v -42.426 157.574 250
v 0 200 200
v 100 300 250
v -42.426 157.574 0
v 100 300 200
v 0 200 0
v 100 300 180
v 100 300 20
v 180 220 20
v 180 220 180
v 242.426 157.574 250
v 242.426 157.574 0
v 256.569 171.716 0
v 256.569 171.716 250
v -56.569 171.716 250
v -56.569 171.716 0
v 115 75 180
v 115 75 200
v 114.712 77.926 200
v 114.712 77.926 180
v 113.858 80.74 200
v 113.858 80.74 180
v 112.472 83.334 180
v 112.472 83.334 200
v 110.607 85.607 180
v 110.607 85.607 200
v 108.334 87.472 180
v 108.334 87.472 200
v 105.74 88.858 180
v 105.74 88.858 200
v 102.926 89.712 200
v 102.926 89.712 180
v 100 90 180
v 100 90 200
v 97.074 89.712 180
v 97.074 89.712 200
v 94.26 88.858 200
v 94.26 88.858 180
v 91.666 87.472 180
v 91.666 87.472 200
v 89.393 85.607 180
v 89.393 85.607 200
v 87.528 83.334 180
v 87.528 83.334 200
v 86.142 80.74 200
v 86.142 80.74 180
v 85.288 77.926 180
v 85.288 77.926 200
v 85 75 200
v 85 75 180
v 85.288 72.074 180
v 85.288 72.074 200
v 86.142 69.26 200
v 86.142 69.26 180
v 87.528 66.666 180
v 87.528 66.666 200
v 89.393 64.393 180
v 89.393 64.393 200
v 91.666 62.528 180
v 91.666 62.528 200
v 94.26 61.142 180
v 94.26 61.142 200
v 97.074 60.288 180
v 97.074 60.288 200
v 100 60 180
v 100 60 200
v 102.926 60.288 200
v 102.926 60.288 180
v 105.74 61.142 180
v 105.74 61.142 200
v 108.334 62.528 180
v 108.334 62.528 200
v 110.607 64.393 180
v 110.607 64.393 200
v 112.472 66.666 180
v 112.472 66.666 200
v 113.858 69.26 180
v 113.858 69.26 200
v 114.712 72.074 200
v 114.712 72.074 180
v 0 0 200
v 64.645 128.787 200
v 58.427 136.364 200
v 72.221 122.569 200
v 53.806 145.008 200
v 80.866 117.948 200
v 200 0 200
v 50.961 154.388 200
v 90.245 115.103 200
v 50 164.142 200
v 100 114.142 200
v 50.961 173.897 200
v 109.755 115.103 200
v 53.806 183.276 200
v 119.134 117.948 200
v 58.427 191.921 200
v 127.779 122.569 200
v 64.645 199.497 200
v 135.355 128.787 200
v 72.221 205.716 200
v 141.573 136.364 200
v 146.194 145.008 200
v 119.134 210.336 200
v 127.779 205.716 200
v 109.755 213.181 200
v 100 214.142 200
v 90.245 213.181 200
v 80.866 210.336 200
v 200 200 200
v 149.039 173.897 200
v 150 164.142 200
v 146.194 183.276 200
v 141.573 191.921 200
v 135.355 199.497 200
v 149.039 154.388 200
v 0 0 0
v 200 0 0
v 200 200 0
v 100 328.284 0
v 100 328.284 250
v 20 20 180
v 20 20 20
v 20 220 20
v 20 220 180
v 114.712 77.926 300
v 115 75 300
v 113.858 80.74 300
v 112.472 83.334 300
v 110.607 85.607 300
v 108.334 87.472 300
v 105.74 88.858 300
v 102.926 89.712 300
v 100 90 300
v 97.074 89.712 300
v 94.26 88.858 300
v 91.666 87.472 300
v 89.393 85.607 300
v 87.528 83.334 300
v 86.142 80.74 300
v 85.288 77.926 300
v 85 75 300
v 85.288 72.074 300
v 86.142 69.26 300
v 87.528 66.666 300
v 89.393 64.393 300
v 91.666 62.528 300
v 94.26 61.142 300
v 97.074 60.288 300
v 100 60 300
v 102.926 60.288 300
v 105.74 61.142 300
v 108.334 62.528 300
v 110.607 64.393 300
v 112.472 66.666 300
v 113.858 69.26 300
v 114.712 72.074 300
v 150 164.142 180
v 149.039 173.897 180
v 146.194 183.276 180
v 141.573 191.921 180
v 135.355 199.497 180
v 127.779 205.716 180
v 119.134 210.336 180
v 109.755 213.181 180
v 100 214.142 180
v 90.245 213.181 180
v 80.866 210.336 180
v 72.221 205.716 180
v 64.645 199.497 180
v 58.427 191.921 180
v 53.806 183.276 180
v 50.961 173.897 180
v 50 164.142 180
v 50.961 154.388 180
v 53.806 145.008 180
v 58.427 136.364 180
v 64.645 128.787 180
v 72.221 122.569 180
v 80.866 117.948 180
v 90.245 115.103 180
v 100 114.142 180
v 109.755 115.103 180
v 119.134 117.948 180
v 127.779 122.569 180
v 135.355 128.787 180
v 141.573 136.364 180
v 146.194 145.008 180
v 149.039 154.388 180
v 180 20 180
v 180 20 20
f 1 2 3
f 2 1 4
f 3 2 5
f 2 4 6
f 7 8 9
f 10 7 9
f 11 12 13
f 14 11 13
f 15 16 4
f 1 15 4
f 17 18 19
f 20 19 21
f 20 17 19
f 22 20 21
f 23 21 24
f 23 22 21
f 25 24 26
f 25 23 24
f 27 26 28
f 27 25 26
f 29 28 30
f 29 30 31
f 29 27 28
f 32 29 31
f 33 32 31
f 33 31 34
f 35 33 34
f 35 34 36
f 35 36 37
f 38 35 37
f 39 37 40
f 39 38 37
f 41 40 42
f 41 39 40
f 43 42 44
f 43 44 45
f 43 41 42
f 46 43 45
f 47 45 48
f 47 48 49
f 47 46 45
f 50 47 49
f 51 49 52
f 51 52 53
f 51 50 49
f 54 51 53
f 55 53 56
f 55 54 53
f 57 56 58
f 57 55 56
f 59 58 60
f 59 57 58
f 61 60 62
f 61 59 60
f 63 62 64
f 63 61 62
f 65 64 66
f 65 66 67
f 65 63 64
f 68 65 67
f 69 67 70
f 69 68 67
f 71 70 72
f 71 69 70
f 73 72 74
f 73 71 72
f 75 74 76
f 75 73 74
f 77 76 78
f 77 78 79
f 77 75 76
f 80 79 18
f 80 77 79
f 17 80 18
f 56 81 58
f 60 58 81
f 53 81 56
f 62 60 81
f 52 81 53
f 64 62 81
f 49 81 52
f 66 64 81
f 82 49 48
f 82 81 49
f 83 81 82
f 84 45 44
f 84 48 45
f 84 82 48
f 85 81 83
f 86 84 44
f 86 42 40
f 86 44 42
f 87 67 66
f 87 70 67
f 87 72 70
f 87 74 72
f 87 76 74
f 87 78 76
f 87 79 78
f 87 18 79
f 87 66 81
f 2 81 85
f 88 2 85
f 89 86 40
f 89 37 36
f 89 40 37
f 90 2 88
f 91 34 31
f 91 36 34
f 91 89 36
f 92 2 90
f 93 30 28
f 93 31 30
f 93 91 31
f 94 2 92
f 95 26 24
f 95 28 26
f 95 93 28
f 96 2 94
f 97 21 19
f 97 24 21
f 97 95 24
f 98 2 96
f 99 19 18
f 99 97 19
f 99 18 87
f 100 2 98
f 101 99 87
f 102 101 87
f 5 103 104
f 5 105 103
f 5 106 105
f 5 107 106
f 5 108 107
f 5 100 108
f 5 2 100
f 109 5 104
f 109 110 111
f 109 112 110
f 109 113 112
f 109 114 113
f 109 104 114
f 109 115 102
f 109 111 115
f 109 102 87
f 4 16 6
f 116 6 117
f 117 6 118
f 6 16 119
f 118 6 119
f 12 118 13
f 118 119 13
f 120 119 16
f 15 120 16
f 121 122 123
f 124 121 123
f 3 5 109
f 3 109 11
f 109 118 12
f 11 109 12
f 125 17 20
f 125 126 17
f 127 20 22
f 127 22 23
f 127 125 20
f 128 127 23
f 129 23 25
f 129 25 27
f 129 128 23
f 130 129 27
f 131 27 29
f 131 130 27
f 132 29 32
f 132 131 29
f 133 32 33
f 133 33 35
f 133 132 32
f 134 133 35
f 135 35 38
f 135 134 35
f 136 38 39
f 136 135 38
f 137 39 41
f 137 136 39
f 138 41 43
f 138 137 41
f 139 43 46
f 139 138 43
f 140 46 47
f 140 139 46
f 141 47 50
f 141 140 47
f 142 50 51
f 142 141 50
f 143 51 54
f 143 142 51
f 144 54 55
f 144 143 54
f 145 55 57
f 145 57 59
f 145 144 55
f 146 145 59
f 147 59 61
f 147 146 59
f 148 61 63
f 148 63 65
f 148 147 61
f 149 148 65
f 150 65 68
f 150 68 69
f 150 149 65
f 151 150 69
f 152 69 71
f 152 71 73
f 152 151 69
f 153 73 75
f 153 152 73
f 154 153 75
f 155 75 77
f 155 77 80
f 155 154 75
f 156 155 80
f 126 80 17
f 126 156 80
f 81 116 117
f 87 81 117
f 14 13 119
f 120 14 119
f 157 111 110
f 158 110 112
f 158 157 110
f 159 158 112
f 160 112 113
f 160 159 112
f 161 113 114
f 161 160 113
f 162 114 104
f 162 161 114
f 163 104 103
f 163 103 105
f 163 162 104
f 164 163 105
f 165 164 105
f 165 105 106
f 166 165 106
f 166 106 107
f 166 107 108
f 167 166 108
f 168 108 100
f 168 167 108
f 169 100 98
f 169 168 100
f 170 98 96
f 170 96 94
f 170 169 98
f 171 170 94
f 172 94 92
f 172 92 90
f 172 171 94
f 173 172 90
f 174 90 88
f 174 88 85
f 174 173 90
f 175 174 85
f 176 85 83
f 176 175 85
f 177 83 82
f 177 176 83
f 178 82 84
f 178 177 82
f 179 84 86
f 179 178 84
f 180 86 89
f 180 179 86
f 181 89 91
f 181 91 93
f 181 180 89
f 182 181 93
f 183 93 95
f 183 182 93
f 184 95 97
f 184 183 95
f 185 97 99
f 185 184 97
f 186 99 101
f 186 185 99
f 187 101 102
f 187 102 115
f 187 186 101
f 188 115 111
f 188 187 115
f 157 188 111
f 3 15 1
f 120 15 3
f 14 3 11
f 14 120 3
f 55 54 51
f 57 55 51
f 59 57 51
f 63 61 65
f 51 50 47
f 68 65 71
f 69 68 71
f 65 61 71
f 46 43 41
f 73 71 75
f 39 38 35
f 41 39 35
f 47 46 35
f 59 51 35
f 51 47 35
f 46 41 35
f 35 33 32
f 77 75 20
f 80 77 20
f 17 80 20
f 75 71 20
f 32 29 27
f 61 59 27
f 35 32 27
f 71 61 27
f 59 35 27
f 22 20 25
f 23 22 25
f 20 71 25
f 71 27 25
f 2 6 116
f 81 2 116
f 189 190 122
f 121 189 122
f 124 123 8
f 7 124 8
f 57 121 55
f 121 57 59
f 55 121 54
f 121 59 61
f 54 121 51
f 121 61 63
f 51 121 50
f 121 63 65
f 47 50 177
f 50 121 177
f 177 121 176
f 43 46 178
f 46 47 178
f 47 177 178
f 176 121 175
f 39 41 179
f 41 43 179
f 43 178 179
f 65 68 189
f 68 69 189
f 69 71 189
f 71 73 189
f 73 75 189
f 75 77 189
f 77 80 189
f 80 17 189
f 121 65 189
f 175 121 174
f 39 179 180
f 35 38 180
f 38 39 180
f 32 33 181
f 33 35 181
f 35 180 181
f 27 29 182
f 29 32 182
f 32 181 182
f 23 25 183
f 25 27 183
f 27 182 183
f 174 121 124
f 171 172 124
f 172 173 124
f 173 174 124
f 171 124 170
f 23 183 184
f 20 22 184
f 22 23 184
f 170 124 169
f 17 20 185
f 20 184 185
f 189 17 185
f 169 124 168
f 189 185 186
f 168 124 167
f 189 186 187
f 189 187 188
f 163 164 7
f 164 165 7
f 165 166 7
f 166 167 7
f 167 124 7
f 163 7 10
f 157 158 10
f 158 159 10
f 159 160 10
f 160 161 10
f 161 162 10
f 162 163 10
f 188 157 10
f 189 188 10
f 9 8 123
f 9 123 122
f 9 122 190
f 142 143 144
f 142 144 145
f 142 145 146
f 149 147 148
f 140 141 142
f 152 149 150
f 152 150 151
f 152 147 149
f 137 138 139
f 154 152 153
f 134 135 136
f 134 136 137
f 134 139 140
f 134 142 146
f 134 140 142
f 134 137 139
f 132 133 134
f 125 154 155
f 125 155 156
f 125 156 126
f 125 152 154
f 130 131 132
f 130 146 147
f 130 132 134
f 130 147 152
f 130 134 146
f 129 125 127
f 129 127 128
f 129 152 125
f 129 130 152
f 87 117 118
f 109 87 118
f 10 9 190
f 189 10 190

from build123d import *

# Parameters (mm, degrees)
SKETCH1_R                = 15
SKETCH1_R_2              = 50
BOSS_EXTRUDE1_DEPTH      = 20
BOSS_EXTRUDE2_DEPTH      = 200
BOSS_EXTRUDE4_START      = 180
SKETCH1_7_R              = 15
SKETCH1_7_R_2            = 50
BOSS_EXTRUDE4_DEPTH      = 20
BOSS_EXTRUDE5_DEPTH      = 250
BOSS_EXTRUDE6_START      = 200
SKETCH1_9_R              = 15
BOSS_EXTRUDE6_DEPTH      = 100
BOSS_EXTRUDE6_DEPTH_BACK = 20


with BuildPart() as part:
    # Sketch1 → Boss-Extrude1 (new body)
    with BuildSketch(Plane.XY):
        Polygon((100, 300), (20, 220), (20, 20), (180, 20), (180, 220), align=None)
        with Locations((100, 75)):
            Circle(SKETCH1_R, mode=Mode.SUBTRACT)
        with Locations((100, 164.142135624)):
            Circle(SKETCH1_R_2, mode=Mode.SUBTRACT)
        with Locations((100, 75)):
            Circle(SKETCH1_R)
        with Locations((100, 164.142135624)):
            Circle(SKETCH1_R_2)
    extrude(amount=BOSS_EXTRUDE1_DEPTH)

    # Sketch1_5 → Boss-Extrude2 (add)
    with BuildSketch(Plane.XY):
        Polygon((0, 200), (0, 0), (200, 0), (200, 200), (180, 220), (180, 20), (20, 20), (20, 220), align=None)
    extrude(amount=BOSS_EXTRUDE2_DEPTH)

    # Sketch1_7 → Boss-Extrude4 (add)
    with BuildSketch(Plane.XY.offset(BOSS_EXTRUDE4_START)):
        Polygon((100, 300), (20, 220), (20, 20), (180, 20), (180, 220), align=None)
        with Locations((100, 75)):
            Circle(SKETCH1_7_R, mode=Mode.SUBTRACT)
        with Locations((100, 164.142135624)):
            Circle(SKETCH1_7_R_2, mode=Mode.SUBTRACT)
    extrude(amount=BOSS_EXTRUDE4_DEPTH)

    # Sketch1_8 → Boss-Extrude5 (add)
    with BuildSketch(Plane.XY):
        Polygon((0, 200), (100, 300), (200, 200), (242.426406871, 157.573593129), (256.568542495, 171.715728753), (100, 328.284271247), (-56.568542495, 171.715728753), (-42.426406871, 157.573593129), align=None)
    extrude(amount=BOSS_EXTRUDE5_DEPTH)


with BuildPart() as body_2:
    # Sketch1_9 → Boss-Extrude6 (new body, two sides)
    with BuildSketch(Plane.XY.offset(BOSS_EXTRUDE6_START)) as boss_extrude6_sk:
        with Locations((100, 75)):
            Circle(SKETCH1_9_R)
    extrude(amount=BOSS_EXTRUDE6_DEPTH)
    extrude(boss_extrude6_sk.sketch, amount=-BOSS_EXTRUDE6_DEPTH_BACK)


solid = Compound([part.part, body_2.part])
